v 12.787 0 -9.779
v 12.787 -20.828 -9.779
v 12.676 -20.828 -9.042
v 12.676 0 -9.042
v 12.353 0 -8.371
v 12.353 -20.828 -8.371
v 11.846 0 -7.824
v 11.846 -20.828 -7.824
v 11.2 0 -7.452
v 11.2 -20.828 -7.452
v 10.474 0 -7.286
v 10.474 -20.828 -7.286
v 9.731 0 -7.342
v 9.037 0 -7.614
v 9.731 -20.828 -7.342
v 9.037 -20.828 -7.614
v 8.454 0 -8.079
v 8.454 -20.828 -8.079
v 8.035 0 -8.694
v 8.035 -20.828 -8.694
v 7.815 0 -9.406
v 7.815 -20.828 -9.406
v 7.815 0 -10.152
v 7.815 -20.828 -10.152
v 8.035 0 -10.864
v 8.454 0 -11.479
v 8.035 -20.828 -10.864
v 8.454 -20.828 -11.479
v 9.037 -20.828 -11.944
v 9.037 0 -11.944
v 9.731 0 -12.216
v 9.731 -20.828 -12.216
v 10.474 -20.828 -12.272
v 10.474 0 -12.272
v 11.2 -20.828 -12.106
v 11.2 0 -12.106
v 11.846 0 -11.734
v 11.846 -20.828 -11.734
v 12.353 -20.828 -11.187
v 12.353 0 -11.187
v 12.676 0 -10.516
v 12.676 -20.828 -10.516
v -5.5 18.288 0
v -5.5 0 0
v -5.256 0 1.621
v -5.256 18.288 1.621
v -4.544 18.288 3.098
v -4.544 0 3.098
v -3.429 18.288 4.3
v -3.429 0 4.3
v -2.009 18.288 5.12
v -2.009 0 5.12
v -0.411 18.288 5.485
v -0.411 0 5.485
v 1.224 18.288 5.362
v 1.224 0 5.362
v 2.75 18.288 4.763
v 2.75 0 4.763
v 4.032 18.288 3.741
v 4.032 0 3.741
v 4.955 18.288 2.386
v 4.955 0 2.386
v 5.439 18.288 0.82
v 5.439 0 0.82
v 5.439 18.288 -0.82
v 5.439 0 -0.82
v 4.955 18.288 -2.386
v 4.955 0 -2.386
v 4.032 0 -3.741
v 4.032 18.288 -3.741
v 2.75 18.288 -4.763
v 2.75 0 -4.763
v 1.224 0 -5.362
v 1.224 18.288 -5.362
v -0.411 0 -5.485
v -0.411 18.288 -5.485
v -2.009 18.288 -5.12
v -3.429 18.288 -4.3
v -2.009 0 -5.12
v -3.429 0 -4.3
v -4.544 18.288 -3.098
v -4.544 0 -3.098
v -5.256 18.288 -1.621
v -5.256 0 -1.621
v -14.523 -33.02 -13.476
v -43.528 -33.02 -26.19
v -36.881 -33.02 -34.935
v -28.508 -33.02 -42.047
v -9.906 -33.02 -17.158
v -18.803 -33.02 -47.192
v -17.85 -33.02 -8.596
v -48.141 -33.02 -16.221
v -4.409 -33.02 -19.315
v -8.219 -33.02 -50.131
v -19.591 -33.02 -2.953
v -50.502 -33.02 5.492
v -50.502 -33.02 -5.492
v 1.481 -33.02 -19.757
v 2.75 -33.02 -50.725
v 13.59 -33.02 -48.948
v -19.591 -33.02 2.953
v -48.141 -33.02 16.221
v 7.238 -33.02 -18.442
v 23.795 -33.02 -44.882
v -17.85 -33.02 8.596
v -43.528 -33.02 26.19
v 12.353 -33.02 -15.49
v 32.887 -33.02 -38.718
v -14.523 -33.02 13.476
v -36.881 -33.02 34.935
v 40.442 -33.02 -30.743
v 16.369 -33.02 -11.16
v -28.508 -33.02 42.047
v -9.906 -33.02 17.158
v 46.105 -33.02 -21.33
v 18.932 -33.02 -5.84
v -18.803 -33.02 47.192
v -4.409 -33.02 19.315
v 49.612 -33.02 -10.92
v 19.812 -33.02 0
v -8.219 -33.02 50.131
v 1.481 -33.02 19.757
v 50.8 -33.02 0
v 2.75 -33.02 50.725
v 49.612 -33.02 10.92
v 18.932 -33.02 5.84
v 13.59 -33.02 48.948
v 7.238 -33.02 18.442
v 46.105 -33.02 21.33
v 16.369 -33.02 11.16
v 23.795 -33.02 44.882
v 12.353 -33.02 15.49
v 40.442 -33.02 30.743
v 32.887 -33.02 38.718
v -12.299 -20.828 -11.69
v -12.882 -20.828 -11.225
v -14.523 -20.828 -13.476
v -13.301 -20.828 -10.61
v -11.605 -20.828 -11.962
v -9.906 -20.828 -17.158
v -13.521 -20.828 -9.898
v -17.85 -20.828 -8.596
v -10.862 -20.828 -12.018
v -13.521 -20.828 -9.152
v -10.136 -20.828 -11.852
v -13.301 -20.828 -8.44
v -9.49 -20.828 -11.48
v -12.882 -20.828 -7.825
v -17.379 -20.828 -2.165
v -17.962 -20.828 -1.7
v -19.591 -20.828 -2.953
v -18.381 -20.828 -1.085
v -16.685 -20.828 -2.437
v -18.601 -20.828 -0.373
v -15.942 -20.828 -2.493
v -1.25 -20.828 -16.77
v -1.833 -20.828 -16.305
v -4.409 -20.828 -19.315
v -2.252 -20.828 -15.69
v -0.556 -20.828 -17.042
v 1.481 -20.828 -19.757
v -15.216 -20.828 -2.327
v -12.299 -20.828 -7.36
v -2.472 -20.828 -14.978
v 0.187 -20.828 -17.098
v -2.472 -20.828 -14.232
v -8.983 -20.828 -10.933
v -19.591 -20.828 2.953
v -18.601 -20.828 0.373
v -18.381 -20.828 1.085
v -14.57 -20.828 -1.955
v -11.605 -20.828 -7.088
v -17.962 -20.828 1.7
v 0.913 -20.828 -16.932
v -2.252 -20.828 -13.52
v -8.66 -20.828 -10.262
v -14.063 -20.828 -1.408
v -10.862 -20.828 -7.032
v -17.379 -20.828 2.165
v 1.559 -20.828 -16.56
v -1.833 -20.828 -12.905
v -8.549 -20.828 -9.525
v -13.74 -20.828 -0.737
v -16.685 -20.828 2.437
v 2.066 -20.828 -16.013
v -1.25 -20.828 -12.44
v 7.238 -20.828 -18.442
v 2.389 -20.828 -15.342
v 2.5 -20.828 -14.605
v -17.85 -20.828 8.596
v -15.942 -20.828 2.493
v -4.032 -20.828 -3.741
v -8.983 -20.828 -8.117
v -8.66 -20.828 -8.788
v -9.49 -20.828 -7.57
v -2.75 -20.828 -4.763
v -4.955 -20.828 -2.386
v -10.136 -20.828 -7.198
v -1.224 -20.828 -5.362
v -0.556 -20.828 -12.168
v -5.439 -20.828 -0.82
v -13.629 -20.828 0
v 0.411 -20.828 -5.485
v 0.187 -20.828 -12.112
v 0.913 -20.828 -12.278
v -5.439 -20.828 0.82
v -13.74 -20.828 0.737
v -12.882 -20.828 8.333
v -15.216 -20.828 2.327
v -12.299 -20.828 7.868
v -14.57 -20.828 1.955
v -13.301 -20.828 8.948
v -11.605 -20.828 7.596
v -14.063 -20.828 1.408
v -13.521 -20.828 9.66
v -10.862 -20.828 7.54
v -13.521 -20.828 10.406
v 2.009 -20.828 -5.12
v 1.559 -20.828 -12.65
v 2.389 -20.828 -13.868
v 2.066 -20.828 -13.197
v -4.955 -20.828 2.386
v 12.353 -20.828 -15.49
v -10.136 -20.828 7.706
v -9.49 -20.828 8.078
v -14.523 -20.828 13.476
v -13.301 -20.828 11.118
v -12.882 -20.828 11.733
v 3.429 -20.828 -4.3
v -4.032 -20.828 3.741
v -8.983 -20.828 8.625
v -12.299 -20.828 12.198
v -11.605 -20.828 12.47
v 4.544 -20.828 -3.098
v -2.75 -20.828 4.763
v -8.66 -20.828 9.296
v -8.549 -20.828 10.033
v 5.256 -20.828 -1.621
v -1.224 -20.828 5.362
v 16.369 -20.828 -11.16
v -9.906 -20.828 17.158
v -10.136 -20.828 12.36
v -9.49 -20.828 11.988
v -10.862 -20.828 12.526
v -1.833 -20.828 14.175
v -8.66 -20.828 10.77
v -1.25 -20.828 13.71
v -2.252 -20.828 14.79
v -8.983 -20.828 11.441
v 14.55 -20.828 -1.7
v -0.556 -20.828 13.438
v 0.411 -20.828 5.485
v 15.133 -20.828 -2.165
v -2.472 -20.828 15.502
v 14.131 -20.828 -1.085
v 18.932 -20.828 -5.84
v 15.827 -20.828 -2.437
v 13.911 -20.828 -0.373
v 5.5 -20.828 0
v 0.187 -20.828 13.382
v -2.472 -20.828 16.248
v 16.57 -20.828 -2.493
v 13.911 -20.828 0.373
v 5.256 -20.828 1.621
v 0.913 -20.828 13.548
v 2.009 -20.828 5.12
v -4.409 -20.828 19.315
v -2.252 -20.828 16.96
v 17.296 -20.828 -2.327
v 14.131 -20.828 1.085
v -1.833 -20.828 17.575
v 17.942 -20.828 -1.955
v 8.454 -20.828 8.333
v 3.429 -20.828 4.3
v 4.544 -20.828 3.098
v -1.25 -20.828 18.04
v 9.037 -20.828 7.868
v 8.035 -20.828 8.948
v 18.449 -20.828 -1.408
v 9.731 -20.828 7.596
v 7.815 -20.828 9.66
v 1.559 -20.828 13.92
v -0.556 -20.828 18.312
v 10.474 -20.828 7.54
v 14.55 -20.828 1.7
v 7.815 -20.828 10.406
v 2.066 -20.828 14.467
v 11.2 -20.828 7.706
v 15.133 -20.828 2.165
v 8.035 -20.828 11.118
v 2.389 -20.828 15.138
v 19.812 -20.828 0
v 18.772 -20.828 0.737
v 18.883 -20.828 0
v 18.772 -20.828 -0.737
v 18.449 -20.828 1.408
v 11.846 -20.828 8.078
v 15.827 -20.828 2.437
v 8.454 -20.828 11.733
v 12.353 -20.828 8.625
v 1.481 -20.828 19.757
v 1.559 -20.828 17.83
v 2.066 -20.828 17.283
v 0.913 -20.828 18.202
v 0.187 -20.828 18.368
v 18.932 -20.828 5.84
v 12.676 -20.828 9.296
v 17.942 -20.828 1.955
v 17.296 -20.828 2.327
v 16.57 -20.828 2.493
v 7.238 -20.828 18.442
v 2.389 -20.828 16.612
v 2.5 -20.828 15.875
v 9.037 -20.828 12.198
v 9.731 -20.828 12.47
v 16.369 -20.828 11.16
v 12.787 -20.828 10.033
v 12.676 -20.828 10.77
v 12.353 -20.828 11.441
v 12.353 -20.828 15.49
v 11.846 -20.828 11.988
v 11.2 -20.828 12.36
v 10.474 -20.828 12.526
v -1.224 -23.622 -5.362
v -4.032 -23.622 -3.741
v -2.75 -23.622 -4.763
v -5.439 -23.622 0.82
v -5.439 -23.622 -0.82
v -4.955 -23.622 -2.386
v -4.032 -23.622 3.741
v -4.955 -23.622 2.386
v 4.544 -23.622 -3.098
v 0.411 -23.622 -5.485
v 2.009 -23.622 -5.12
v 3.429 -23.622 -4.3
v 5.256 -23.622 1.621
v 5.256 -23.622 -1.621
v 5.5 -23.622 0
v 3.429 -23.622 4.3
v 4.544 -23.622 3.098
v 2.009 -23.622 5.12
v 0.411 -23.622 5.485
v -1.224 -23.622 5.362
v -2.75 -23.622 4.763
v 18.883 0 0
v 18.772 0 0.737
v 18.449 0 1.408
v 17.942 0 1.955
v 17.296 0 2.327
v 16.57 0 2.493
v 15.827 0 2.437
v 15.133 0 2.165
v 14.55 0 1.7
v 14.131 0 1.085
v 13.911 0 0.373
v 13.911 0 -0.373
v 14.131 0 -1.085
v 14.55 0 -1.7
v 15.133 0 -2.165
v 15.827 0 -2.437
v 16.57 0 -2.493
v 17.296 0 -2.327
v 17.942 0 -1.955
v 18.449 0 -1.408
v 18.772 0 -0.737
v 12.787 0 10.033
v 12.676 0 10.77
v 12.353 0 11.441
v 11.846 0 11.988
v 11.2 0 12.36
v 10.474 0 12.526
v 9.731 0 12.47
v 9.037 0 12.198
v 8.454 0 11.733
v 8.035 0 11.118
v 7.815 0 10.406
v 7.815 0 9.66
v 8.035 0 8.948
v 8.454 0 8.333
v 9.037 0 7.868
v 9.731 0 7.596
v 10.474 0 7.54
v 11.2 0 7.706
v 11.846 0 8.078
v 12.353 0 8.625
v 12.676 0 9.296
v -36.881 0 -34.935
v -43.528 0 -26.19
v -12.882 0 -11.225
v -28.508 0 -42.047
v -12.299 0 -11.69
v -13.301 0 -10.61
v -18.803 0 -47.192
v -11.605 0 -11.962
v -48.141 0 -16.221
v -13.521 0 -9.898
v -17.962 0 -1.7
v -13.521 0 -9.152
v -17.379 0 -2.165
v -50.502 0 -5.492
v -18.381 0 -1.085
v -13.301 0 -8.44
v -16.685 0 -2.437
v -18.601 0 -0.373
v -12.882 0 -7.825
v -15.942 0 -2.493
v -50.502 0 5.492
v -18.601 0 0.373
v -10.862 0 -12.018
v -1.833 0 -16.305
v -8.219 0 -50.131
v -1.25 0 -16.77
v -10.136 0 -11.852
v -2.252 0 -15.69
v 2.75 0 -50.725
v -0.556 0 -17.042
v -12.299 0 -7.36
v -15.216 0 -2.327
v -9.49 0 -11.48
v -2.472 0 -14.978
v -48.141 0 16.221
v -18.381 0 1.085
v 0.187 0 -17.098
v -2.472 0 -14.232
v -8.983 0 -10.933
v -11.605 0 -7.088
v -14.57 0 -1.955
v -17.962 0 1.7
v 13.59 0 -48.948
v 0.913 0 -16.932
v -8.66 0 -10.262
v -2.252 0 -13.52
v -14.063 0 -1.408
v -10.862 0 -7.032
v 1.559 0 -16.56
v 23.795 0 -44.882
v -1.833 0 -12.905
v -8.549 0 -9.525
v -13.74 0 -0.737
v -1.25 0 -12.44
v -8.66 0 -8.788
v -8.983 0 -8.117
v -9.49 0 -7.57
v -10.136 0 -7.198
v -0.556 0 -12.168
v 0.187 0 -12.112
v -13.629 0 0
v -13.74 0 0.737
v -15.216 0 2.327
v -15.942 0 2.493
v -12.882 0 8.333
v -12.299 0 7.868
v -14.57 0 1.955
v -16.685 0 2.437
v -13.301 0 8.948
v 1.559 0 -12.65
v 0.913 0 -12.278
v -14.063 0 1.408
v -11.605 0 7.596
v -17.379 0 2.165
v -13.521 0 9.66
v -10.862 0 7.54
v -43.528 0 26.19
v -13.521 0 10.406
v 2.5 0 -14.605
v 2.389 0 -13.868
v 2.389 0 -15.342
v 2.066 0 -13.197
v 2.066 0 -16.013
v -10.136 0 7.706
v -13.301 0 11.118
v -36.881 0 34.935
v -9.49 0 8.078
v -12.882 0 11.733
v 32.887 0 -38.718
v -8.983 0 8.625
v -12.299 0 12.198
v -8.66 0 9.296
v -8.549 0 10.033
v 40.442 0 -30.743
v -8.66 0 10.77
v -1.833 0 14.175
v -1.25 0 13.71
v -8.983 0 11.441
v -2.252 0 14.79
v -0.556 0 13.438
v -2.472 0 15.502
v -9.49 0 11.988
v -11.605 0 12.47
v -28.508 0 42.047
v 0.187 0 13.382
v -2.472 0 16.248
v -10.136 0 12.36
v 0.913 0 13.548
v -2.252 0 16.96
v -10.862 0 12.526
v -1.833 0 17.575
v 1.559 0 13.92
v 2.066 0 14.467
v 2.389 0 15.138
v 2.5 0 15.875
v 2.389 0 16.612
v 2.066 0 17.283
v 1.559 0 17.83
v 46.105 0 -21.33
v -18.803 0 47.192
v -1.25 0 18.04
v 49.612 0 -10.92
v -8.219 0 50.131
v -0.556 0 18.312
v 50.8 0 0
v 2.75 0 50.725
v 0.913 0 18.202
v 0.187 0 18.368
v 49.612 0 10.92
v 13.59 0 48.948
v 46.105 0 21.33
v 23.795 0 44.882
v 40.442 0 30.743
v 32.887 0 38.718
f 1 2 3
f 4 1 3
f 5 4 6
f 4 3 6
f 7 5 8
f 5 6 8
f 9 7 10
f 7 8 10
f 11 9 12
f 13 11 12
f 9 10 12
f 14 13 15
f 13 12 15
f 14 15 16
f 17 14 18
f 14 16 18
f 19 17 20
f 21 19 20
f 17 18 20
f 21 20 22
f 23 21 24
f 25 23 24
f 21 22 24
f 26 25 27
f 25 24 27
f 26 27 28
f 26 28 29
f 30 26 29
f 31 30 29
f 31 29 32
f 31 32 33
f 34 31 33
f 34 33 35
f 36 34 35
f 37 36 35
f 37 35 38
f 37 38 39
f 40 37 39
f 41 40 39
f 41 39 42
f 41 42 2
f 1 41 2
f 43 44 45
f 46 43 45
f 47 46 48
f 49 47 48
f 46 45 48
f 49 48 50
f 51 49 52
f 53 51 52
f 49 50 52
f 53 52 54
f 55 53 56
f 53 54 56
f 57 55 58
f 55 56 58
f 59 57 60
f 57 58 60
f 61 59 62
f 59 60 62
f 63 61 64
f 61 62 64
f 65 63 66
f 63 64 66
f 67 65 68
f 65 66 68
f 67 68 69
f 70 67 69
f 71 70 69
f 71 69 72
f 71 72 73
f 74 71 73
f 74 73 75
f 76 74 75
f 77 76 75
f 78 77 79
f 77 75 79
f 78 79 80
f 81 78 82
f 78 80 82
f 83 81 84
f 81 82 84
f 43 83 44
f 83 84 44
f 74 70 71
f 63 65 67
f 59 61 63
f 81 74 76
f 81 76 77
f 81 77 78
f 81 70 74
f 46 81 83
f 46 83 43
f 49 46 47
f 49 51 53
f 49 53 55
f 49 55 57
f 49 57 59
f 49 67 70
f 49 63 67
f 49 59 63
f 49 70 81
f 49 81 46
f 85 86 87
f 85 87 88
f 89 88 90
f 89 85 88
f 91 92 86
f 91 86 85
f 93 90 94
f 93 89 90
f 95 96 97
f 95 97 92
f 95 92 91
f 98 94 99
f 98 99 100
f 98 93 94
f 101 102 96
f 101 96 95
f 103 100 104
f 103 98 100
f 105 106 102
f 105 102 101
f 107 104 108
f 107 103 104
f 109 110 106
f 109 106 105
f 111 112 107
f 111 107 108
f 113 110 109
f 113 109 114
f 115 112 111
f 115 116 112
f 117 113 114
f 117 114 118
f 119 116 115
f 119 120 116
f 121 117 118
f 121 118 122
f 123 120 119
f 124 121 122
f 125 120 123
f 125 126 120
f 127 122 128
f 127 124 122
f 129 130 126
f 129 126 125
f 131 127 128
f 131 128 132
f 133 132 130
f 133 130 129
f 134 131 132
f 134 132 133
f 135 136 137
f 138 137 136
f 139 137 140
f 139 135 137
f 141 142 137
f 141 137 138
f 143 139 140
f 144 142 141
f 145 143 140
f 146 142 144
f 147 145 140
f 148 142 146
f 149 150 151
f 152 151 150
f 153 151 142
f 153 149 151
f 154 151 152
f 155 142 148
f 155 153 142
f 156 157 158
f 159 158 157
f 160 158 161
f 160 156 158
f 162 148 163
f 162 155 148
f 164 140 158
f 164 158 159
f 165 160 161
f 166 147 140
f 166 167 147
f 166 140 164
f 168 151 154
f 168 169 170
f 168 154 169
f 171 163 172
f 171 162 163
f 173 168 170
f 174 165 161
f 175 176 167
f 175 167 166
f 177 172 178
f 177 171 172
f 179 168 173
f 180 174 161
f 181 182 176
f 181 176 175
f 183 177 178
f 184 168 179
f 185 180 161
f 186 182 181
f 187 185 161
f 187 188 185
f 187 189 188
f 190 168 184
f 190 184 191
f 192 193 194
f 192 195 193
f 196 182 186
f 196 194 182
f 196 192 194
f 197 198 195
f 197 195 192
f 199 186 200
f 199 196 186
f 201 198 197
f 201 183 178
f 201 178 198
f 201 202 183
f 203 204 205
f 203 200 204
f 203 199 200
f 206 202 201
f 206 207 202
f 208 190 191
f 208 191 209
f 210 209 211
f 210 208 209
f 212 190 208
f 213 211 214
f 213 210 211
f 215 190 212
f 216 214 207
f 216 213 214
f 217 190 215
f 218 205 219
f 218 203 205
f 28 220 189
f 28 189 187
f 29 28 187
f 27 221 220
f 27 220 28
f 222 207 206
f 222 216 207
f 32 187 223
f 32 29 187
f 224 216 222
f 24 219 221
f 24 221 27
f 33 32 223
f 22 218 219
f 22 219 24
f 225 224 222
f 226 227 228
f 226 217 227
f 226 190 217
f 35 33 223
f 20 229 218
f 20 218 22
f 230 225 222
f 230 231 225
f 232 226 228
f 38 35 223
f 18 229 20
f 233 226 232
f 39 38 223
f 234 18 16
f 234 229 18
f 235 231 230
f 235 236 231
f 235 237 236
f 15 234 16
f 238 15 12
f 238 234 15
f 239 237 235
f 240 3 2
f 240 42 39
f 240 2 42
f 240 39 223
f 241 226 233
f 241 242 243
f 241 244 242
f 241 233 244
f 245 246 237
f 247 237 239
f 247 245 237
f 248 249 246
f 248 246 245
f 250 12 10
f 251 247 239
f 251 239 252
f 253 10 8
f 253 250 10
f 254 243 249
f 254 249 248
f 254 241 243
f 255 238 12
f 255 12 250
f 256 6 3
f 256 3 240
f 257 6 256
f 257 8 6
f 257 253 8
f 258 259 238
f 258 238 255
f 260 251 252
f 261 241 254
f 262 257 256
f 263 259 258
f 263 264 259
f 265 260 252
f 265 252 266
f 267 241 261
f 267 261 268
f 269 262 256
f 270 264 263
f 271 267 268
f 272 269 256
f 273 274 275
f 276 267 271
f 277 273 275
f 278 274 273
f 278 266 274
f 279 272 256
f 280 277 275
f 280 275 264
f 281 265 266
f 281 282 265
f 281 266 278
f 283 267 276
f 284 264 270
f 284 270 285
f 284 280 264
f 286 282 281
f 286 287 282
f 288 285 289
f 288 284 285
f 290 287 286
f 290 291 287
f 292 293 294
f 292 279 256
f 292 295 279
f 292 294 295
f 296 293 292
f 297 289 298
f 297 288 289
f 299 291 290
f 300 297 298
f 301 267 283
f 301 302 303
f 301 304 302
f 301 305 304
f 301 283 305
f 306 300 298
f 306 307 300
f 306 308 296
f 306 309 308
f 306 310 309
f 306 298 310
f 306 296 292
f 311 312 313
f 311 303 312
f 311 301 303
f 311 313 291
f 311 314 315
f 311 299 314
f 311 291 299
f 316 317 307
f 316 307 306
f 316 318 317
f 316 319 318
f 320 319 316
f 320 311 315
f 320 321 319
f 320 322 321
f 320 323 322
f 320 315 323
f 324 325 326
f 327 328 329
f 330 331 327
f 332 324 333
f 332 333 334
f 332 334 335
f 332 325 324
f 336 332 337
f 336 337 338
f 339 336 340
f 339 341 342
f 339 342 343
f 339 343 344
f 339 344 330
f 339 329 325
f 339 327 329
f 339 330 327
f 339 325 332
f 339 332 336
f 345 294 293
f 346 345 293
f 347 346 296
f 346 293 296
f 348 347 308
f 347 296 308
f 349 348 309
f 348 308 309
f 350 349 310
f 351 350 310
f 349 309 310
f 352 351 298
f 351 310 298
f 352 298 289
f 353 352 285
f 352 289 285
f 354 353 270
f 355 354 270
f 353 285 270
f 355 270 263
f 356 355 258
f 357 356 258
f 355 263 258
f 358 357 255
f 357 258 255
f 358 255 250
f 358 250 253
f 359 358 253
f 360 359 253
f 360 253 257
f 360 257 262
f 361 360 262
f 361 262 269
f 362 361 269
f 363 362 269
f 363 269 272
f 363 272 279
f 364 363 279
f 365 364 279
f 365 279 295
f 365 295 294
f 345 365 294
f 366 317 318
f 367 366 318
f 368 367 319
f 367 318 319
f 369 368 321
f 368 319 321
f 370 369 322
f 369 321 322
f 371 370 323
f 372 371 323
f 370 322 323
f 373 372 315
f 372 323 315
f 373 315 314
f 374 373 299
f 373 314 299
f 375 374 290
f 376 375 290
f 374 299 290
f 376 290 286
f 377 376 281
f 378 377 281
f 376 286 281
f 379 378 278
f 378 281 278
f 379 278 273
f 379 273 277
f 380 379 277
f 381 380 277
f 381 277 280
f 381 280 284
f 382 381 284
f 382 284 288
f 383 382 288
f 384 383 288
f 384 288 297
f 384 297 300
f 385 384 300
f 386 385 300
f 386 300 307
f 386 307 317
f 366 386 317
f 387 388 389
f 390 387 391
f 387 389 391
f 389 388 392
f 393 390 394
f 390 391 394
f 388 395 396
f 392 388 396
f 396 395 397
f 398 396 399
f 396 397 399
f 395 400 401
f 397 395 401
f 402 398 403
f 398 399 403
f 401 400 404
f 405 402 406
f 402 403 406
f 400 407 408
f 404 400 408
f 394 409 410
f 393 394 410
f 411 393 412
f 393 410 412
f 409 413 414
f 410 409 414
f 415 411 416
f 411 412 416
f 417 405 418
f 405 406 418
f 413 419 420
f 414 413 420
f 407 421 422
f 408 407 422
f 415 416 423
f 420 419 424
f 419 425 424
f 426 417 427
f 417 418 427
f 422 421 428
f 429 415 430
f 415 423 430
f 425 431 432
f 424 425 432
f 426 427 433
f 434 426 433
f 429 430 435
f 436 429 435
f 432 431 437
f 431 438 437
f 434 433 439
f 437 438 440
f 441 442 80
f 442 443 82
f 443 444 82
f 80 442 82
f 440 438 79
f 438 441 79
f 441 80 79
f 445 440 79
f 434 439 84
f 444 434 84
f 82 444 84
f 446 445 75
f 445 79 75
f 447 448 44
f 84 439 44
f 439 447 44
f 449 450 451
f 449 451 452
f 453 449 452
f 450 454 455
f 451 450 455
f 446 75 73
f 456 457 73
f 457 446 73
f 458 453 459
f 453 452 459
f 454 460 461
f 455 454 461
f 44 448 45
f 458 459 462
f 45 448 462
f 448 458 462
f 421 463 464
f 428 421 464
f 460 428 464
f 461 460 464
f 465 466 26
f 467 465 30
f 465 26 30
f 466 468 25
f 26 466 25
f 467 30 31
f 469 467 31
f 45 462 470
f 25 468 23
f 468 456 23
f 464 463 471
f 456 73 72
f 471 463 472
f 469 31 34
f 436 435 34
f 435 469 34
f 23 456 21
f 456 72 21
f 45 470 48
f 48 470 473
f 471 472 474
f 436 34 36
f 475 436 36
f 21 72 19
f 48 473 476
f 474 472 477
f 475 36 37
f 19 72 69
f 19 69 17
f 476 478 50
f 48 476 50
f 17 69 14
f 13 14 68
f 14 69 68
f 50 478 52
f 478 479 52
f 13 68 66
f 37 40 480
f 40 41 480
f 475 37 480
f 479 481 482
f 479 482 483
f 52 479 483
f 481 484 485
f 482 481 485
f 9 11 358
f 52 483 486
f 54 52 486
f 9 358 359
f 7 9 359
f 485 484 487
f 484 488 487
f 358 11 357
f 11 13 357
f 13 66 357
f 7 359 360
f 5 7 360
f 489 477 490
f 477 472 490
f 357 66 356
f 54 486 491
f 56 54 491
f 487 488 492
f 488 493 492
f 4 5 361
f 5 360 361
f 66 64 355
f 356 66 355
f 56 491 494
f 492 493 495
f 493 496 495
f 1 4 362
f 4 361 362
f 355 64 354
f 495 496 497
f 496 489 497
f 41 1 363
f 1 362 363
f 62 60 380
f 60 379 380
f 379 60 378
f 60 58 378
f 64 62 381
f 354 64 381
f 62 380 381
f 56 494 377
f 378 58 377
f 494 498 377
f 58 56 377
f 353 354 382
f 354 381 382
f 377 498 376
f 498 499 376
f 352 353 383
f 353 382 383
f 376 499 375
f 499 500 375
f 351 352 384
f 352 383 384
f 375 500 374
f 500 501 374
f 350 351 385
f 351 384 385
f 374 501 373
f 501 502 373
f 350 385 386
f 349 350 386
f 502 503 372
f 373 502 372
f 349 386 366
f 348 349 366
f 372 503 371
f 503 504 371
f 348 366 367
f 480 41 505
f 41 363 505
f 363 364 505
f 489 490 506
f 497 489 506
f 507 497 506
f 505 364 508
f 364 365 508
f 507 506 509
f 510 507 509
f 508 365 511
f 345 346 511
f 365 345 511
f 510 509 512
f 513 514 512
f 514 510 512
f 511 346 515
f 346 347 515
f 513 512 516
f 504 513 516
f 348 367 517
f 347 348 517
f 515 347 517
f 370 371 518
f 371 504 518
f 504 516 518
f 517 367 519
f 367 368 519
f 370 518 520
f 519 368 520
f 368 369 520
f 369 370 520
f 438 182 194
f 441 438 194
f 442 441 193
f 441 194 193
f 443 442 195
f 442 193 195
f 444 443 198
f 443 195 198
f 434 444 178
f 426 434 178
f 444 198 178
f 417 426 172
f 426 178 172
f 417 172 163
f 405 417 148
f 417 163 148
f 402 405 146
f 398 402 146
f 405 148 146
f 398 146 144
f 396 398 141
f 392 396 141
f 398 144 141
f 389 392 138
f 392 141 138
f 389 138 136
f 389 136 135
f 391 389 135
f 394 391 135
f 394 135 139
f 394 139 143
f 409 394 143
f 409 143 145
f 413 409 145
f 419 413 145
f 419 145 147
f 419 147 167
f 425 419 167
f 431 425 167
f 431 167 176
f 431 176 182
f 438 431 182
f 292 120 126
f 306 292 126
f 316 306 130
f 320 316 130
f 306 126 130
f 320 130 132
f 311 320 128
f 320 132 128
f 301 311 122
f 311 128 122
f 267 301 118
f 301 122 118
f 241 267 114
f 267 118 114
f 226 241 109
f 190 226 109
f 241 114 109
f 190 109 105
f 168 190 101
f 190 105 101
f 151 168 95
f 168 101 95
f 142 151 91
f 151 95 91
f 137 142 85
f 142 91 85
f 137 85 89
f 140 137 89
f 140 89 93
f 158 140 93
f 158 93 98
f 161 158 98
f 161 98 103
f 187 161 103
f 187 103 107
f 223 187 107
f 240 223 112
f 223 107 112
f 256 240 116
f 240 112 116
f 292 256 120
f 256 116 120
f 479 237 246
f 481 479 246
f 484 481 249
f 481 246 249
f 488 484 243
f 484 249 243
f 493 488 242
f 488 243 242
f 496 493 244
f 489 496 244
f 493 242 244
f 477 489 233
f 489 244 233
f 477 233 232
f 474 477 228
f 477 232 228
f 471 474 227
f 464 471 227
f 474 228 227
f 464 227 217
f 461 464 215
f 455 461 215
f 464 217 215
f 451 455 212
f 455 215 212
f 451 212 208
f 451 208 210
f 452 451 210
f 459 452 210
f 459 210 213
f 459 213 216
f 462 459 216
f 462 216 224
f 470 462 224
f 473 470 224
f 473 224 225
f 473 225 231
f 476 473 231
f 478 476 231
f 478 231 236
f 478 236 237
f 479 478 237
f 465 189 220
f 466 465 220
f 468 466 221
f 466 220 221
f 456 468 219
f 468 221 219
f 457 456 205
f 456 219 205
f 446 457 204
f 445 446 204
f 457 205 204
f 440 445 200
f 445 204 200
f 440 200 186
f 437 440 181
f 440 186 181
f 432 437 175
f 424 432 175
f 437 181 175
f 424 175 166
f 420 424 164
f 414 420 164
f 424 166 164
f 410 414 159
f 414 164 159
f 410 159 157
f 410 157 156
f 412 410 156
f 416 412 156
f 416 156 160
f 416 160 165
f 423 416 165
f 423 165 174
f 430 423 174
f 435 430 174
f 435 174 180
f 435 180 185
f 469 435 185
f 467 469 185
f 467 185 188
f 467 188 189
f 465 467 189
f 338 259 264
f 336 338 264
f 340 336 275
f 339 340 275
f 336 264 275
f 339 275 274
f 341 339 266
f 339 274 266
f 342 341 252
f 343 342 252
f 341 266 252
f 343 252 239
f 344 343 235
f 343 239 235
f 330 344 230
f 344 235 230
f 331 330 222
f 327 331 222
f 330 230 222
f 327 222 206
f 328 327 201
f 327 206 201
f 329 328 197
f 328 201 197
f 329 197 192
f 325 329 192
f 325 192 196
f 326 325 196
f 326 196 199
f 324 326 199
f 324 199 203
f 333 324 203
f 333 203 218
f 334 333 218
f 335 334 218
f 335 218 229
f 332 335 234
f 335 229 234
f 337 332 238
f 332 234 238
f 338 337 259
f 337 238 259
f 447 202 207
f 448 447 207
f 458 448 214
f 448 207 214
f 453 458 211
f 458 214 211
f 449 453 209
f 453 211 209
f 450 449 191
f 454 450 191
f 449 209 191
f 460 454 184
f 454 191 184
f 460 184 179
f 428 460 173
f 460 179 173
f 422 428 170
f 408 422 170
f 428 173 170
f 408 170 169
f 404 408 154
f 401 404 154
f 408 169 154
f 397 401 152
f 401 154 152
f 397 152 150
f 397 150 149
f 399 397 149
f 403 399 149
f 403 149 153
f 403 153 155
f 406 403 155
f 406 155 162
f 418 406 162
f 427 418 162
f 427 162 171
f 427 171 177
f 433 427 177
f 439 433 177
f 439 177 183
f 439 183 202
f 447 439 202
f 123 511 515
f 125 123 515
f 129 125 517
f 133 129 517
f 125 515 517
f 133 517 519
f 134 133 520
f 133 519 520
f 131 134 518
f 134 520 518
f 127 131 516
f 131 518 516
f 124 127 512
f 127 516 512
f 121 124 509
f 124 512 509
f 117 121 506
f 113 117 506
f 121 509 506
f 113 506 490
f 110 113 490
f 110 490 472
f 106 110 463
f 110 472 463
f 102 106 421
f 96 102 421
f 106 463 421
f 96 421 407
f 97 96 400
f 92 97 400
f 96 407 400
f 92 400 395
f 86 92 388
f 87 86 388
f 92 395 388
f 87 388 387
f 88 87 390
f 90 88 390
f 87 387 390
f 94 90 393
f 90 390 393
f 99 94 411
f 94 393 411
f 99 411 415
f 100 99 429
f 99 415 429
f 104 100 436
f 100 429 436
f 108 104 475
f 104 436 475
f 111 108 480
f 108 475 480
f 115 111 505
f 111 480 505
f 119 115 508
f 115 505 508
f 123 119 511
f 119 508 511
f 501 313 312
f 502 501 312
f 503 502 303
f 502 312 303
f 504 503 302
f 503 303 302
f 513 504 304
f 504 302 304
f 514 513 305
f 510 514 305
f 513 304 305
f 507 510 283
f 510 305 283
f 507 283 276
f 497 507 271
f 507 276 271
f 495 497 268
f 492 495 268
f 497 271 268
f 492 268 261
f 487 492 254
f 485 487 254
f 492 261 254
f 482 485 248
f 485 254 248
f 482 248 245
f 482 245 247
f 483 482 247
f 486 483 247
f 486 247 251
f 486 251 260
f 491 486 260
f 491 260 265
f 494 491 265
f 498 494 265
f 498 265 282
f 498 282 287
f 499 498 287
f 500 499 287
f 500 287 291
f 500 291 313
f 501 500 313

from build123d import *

# Parameters (mm, degrees)
F0_R     = 50.8
F1_DEPTH = 33.02
F2_R     = 19.812
F3_DEPTH = 12.192
F4_R     = 5.5
F5_DEPTH = 2.794
F6_R     = 2.5
F7_DEPTH = 25.4
F8_R     = 5.5
F9_DEPTH = 18.288


with BuildPart() as f1:
    # F0 (on Front) → F1 (new body)
    with BuildSketch(Plane.XZ):
        Circle(F0_R)
    extrude(amount=F1_DEPTH)

    # F2 (on face) → F3 (cut)
    with BuildSketch(Plane.XZ.offset(33.02)):
        Circle(F2_R)
    extrude(amount=-F3_DEPTH, mode=Mode.SUBTRACT)

    # F4 (on face) → F5 (join)
    with BuildSketch(Plane.XZ.offset(20.828)):
        Circle(F4_R)
    extrude(amount=F5_DEPTH)

    # F6 (on face) → F7 (cut)
    with BuildSketch(Plane.XZ.offset(20.828)):
        with Locations((0, 15.8750005066)):
            Circle(F6_R)
        with Locations((-11.048999615, 10.0330002606)):
            Circle(F6_R)
        with Locations((-16.1290001124, 0)):
            Circle(F6_R)
        with Locations((-11.048999615, -9.5250001177)):
            Circle(F6_R)
        with Locations((0, -14.6050006151)):
            Circle(F6_R)
        with Locations((10.286998935, -9.7789997235)):
            Circle(F6_R)
        with Locations((16.3829997182, 0)):
            Circle(F6_R)
        with Locations((10.286998935, 10.0330002606)):
            Circle(F6_R)
    extrude(amount=-F7_DEPTH, mode=Mode.SUBTRACT)

    # F8 (on face) → F9 (join)
    with BuildSketch(Plane(origin=(0, 0, 0), x_dir=(-1, 0, 0), z_dir=(0, 1, 0))):
        Circle(F8_R)
    extrude(amount=F9_DEPTH)


solid = f1.part
